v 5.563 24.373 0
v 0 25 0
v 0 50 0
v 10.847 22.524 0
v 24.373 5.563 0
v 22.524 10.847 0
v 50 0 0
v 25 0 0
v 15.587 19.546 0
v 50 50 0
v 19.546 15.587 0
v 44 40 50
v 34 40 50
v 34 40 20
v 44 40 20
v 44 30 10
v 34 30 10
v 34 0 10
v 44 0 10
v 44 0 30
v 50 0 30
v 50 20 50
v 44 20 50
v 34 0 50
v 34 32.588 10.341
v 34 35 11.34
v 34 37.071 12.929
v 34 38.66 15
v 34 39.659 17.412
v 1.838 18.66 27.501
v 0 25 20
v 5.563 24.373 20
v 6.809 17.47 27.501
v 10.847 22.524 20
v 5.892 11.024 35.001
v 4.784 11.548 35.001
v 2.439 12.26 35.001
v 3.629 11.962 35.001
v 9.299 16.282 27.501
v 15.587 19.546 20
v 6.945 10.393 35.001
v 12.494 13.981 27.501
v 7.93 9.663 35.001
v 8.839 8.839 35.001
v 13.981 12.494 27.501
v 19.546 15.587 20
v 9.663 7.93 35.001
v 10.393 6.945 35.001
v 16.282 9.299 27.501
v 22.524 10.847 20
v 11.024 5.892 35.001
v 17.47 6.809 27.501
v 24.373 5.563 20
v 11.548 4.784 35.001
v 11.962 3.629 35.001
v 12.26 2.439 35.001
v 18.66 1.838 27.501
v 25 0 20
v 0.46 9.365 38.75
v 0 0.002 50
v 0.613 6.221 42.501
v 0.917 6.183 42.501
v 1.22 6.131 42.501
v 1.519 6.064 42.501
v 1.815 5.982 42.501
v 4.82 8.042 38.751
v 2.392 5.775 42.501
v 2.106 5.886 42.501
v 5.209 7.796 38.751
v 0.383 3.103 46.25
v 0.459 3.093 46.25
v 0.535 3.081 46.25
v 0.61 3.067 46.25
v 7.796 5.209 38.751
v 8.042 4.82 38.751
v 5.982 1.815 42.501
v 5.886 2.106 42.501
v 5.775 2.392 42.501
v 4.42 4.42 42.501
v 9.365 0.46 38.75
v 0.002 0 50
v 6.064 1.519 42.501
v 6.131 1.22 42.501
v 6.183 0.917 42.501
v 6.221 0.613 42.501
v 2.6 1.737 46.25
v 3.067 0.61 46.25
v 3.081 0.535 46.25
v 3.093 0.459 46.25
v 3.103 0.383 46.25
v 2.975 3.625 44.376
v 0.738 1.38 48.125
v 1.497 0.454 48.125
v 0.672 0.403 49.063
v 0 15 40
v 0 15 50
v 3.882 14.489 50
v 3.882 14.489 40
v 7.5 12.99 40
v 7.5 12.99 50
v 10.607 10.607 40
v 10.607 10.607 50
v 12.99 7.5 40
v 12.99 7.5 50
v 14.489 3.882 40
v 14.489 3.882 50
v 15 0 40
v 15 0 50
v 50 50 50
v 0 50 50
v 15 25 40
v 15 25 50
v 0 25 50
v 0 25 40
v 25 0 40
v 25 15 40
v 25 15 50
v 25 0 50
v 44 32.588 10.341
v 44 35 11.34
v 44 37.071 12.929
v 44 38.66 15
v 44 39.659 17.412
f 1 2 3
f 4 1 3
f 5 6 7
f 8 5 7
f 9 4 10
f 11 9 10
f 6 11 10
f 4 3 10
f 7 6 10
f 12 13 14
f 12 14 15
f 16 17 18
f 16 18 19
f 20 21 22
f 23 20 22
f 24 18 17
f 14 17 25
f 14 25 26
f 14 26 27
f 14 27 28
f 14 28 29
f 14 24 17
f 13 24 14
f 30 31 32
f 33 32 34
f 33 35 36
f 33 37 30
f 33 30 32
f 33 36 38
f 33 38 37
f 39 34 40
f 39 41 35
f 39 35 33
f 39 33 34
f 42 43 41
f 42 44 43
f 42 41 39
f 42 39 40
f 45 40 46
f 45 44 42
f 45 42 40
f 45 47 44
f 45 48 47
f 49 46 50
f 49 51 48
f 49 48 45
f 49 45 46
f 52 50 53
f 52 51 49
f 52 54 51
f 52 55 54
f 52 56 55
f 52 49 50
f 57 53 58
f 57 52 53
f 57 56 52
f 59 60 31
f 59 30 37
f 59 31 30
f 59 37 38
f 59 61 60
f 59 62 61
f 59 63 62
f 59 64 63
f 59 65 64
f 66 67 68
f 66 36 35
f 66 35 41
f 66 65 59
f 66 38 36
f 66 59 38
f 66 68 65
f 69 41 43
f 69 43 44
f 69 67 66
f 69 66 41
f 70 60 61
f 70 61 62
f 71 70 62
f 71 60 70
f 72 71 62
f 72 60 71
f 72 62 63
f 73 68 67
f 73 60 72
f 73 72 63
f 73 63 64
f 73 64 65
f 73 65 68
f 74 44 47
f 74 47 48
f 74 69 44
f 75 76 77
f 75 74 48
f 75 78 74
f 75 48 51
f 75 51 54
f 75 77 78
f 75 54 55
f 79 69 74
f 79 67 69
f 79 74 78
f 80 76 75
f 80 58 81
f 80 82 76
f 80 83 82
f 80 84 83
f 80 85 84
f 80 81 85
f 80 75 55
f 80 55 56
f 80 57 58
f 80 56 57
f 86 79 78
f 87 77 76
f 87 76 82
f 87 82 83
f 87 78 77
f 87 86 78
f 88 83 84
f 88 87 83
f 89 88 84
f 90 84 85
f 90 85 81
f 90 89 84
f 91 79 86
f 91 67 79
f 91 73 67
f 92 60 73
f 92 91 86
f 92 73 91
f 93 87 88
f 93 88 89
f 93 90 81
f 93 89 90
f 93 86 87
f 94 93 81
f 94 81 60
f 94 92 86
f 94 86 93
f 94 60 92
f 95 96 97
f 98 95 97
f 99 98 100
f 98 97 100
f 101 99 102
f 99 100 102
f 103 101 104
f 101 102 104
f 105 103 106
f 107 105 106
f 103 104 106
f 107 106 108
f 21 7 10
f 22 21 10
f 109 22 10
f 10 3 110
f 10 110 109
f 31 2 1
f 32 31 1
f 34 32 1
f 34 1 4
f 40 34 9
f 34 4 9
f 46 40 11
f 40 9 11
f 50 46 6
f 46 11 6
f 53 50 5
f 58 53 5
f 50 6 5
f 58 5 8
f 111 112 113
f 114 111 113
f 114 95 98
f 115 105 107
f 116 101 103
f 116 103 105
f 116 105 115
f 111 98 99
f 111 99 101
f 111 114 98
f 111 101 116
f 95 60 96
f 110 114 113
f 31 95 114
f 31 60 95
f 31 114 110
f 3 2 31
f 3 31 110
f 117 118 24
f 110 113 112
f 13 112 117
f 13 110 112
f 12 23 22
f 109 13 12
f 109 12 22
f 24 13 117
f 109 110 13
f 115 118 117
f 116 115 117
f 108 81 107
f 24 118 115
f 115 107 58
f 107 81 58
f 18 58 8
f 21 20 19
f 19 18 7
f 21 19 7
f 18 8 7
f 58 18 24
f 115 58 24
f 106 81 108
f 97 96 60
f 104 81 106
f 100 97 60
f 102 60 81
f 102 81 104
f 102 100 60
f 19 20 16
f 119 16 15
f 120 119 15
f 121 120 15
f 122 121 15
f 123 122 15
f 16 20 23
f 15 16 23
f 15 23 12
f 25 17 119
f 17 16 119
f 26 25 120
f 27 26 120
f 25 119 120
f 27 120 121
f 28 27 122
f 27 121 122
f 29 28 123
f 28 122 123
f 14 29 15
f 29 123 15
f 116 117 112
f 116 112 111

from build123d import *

# Parameters (mm, degrees)
F0_W      = 50
F0_H      = 50
F1_DEPTH  = 50
F2_W      = 10
F2_H      = 40
F3_DEPTH  = 40
F6_R      = 10
F7_DEPTH  = 6
F9_DEPTH  = 20
F14_DEPTH = 10
F15_SIZE  = 10


with BuildPart() as f1:
    # F0 (on Top) → F1 (new body)
    with BuildSketch(Plane.XY):
        with Locations((25, 25)):
            Rectangle(F0_W, F0_H)
    extrude(amount=F1_DEPTH)

    # F2 (on face) → F3 (cut)
    with BuildSketch(Plane.XY.offset(50)):
        with Locations((39, 20)):
            Rectangle(F2_W, F2_H)
    extrude(amount=-F3_DEPTH, mode=Mode.SUBTRACT)

    # F6
    f6_edges = [f1.edges().sort_by_distance(p)[0] for p in [
        (39, 40, 10),
    ]]
    fillet(f6_edges, radius=F6_R)

    # F5 (on face) → F7 (cut)
    with BuildSketch(Plane.YZ.offset(50)):
        Polygon((0, 50), (0, 30), (20, 50), align=None)
    extrude(amount=-F7_DEPTH, mode=Mode.SUBTRACT)

    # F8 (on face) → F9 (cut)
    with BuildSketch(Plane(origin=(0, 0, 0), x_dir=(1, 0, 0), z_dir=(0, 0, -1))):
        with BuildLine():
            ThreePointArc((0, -25), (17.6776695297, -17.6776695297), (25, 0))
            Line((25, 0), (0, 0))
            Line((0, 0), (0, -25))
        make_face()
    extrude(amount=-F9_DEPTH, mode=Mode.SUBTRACT)

    # F9_face (on face) → F11 section 0
    with BuildSketch(Plane(origin=(10.6103295395, 10.6103295395, 20), x_dir=(1, 0, 0), z_dir=(0, 0, -1)), mode=Mode.PRIVATE) as f11_s0:
        with BuildLine():
            ThreePointArc((-10.6103295395, -14.3896704605), (7.0673399902, -7.0673399902), (14.3896704605, 10.6103295395))
            Line((14.3896704605, 10.6103295395), (-10.6103295395, 10.6103295395))
            Line((-10.6103295395, 10.6103295395), (-10.6103295395, -14.3896704605))
        make_face()
    loft([f11_s0.sketch, Vertex(0, 0, 50.0027686357)], mode=Mode.SUBTRACT)

    # F13 (on face) → F14 (cut)
    with BuildSketch(Plane.XY.offset(50)):
        with BuildLine():
            ThreePointArc((0, 15), (10.6066017178, 10.6066017178), (15, 0))
            Line((15, 0), (25, 0))
            Line((25, 0), (25, 25))
            Line((25, 25), (0, 25))
            Line((0, 25), (0, 15))
        make_face()
    extrude(amount=-F14_DEPTH, mode=Mode.SUBTRACT)

    # F15
    f15_edges = [f1.edges().sort_by_distance(p)[0] for p in [
        (25, 25, 45),
    ]]
    chamfer(f15_edges, length=F15_SIZE)


solid = f1.part
